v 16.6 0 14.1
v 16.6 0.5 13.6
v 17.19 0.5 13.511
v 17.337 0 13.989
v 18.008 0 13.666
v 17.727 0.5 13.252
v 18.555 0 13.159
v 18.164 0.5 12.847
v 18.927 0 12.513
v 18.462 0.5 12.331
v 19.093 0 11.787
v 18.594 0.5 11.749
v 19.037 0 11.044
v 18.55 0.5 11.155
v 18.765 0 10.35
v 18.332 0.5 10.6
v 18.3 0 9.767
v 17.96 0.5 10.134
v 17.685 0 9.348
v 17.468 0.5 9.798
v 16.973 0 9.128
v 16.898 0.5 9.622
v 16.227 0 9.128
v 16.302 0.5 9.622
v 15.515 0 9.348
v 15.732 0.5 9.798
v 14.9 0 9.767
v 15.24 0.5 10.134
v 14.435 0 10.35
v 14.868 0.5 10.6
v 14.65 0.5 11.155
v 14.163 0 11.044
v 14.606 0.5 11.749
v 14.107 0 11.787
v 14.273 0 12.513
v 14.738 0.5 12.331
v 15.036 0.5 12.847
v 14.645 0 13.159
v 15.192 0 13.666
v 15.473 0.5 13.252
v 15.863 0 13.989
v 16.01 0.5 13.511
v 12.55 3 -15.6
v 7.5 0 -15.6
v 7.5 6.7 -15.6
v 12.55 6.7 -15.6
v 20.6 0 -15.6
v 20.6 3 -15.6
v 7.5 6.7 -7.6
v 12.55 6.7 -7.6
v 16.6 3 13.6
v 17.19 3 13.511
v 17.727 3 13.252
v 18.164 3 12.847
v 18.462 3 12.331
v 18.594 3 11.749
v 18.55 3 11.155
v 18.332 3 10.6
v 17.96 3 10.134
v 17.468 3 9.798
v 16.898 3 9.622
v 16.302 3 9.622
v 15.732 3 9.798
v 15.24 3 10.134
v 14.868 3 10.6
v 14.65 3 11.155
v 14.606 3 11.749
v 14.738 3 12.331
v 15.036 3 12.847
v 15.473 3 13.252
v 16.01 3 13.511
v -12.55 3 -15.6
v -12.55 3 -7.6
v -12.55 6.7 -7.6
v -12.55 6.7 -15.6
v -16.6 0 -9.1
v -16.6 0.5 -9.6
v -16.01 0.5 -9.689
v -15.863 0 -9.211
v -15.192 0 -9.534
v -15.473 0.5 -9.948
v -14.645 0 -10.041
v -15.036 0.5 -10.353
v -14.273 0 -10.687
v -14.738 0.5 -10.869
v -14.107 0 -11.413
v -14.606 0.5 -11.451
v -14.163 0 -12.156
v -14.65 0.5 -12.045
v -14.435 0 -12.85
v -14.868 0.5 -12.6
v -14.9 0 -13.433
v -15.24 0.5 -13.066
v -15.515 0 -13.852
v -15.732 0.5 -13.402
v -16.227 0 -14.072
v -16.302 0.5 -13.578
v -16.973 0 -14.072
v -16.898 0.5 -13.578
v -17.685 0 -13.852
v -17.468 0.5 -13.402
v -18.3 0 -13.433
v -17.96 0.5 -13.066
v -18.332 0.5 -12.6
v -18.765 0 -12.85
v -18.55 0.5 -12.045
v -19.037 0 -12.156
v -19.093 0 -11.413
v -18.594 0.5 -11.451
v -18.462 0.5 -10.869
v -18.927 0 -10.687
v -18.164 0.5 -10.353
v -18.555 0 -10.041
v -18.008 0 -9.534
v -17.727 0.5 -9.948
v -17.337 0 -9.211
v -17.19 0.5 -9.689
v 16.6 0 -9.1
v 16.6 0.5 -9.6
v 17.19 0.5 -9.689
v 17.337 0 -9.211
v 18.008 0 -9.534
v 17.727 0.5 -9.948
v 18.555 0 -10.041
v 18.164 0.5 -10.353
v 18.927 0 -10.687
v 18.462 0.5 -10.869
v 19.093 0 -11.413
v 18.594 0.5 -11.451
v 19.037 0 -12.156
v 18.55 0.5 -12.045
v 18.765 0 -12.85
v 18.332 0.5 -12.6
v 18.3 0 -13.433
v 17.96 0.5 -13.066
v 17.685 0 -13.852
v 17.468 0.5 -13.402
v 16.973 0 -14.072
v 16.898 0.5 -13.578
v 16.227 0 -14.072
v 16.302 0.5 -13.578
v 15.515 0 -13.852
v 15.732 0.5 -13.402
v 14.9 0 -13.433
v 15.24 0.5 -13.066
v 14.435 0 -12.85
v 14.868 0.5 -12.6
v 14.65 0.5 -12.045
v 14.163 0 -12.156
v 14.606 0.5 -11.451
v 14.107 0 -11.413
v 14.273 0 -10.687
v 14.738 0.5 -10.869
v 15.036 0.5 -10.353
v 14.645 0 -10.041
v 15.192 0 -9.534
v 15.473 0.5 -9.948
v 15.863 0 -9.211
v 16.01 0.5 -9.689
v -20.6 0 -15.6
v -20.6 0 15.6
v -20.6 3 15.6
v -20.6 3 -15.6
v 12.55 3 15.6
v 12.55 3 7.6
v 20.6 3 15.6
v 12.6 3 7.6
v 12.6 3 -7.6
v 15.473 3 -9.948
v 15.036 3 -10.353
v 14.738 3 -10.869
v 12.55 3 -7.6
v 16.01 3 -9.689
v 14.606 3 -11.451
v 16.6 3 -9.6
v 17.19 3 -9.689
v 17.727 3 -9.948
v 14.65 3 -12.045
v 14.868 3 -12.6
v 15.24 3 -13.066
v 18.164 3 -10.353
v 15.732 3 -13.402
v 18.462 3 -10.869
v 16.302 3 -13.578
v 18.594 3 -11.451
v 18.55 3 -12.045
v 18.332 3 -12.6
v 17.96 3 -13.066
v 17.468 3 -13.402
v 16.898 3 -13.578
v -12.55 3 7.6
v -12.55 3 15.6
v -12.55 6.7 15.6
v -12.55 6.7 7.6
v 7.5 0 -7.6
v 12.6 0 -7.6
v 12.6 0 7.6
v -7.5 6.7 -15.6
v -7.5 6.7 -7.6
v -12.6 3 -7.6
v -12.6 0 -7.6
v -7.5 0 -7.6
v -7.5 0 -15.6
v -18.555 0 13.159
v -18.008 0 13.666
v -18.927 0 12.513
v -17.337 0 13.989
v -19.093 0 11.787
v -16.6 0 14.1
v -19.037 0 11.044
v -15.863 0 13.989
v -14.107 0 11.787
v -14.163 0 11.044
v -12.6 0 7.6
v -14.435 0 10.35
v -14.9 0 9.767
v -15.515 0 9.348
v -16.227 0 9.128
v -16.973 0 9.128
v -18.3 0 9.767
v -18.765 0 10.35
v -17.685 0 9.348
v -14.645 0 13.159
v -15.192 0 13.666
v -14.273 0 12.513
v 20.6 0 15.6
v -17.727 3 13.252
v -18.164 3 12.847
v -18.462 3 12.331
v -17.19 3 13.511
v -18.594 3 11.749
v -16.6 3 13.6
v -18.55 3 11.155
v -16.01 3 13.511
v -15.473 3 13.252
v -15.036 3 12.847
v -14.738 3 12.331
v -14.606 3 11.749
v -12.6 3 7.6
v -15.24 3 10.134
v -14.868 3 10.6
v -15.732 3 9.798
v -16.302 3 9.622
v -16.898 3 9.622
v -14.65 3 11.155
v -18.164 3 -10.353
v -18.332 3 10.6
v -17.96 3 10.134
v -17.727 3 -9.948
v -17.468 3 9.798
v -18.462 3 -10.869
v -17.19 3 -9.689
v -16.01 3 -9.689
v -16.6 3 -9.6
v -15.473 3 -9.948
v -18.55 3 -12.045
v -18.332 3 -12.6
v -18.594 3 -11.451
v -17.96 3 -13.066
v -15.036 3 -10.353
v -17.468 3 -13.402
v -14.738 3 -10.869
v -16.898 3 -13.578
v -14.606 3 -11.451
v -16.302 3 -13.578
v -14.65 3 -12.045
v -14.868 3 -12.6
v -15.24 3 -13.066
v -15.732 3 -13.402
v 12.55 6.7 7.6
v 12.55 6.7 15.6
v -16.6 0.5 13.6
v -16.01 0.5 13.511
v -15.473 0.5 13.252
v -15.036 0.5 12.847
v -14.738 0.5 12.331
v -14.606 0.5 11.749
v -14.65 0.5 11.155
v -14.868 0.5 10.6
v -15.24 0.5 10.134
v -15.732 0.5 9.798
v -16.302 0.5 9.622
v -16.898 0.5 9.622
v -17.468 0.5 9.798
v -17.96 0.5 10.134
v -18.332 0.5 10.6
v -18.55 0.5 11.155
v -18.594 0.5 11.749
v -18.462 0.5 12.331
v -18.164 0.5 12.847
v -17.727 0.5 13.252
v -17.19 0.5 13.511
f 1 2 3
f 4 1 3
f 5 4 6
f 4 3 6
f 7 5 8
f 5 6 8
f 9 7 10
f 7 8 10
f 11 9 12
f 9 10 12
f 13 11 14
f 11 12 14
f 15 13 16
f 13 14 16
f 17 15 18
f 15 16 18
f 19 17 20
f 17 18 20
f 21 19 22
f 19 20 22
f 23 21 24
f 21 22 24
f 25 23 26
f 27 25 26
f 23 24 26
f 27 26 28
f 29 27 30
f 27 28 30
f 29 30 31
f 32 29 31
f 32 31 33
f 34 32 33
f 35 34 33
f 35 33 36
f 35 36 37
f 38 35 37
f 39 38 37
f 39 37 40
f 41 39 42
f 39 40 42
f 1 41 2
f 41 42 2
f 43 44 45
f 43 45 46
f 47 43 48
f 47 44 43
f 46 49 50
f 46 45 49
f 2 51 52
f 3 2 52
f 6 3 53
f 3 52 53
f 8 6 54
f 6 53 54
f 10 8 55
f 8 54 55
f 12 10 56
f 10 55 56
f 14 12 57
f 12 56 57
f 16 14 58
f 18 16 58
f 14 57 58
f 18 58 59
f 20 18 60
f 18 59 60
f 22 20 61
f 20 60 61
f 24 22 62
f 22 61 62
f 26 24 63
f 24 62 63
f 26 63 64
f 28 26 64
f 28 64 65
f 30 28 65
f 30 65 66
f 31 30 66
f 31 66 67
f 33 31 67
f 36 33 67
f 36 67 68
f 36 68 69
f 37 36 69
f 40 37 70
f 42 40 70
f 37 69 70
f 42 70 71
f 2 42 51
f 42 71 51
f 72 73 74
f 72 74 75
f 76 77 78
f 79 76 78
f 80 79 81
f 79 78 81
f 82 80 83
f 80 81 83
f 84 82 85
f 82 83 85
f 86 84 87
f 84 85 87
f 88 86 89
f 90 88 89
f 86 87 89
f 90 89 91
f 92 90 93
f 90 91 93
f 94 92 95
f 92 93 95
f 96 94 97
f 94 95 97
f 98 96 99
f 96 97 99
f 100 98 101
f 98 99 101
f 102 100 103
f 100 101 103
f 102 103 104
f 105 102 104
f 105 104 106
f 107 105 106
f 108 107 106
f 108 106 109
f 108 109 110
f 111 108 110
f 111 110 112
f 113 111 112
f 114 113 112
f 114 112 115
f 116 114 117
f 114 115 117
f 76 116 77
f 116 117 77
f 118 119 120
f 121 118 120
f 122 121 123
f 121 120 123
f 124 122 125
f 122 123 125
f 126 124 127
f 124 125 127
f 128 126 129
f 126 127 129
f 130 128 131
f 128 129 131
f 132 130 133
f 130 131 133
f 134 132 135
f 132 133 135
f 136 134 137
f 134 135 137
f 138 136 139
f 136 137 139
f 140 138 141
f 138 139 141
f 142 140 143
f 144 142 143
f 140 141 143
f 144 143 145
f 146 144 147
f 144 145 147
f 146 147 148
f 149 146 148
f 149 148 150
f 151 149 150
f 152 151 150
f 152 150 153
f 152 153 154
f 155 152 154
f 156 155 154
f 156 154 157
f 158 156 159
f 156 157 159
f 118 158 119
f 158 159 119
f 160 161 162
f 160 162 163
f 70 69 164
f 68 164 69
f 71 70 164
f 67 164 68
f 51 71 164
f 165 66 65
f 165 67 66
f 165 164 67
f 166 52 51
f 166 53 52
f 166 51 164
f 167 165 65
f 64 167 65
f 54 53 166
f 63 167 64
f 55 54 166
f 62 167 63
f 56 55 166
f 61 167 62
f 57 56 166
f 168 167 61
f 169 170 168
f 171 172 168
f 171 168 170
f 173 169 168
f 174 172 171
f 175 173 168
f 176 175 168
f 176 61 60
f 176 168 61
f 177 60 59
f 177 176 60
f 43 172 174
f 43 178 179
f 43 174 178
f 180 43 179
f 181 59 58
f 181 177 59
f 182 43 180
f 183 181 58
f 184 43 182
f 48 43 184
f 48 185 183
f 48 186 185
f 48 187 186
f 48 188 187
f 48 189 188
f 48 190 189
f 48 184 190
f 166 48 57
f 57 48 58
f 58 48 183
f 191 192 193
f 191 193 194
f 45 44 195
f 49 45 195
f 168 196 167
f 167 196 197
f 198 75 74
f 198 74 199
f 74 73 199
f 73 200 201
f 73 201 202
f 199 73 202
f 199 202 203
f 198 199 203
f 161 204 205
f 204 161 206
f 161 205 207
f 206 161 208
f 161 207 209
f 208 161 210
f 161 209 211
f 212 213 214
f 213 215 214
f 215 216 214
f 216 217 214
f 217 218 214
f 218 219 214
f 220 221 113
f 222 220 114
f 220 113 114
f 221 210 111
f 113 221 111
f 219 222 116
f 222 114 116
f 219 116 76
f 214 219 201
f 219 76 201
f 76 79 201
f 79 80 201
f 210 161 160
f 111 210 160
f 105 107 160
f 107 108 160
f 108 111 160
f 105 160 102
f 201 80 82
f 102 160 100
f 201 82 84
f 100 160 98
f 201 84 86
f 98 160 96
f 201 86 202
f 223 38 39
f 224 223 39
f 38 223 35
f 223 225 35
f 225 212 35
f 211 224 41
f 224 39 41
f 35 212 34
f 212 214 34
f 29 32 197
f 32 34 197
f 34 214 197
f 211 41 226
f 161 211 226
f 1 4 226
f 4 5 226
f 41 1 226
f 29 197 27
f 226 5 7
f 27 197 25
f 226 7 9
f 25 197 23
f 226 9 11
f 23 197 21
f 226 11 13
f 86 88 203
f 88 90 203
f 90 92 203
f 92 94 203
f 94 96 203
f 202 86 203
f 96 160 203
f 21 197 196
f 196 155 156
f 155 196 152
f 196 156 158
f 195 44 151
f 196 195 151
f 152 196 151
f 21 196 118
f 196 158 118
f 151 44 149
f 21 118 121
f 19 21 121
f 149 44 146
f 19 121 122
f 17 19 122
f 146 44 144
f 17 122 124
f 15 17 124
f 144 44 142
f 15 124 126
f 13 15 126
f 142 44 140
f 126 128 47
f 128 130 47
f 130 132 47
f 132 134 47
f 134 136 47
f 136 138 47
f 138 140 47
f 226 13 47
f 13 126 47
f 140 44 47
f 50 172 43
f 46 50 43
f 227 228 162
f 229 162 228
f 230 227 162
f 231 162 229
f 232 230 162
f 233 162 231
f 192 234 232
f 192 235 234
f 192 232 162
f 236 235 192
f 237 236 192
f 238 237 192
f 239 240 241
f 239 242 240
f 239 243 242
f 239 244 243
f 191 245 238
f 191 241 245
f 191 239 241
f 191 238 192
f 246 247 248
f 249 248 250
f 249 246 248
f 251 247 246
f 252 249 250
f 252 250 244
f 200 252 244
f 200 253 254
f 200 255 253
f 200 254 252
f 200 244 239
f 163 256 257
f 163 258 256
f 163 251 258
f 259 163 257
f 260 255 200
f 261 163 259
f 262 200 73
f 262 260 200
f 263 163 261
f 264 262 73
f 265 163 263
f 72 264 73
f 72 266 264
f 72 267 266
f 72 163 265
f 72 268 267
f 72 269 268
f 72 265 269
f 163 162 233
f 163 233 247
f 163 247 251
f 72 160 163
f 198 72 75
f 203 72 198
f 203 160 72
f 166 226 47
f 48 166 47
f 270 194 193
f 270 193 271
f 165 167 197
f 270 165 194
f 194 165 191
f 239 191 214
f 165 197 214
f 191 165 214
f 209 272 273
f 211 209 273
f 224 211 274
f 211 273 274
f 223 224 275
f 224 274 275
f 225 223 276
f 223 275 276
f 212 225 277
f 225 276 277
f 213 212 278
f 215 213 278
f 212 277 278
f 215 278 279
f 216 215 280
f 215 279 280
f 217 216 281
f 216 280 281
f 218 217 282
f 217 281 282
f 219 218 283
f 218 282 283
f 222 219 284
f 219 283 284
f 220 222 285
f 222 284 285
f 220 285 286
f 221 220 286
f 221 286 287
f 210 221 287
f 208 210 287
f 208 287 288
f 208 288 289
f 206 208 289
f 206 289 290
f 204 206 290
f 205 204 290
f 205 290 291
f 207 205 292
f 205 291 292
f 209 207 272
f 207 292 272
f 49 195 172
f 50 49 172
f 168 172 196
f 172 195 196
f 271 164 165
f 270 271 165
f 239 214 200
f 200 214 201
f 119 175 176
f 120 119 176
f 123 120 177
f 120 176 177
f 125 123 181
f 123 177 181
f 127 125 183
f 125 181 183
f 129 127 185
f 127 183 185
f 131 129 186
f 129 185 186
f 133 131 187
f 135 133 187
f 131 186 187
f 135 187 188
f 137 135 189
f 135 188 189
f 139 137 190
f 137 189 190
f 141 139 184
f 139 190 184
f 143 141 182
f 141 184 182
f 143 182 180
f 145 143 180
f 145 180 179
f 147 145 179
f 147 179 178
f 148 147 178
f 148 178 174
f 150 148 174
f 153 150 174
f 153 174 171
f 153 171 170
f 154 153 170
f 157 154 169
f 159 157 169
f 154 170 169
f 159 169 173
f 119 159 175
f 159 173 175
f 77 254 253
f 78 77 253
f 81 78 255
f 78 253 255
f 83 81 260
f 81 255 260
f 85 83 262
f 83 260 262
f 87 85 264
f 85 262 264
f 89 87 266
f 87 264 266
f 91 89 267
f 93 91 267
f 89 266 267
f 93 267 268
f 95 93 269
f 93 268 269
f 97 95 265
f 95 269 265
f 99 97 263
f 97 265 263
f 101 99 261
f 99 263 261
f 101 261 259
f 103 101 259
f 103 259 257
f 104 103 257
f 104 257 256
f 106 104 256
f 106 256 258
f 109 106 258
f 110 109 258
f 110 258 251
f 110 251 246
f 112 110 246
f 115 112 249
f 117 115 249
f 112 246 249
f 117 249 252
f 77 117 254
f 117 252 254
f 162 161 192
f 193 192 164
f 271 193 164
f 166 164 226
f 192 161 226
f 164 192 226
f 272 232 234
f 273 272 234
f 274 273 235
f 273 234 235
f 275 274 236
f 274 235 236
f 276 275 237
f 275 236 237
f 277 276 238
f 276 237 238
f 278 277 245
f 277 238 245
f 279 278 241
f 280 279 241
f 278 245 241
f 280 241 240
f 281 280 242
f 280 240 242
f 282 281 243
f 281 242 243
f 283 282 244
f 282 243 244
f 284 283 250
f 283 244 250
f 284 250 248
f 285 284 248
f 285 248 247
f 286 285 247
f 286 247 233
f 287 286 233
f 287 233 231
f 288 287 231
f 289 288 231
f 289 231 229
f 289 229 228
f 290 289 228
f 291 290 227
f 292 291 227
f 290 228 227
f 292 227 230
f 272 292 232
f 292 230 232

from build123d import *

# Parameters (mm, degrees)
SKETCH1_W           = 41.2
SKETCH1_H           = 31.2
BOSS_EXTRUDE1_DEPTH = 3
SKETCH2_W           = 25.1
SKETCH2_H           = 31.2
BOSS_EXTRUDE2_DEPTH = 3.7
SKETCH3_R           = 2
CUT_EXTRUDE1_DEPTH  = 3
CUT_EXTRUDE2_REACH  = 28.695
CHAMFER1_SIZE       = 0.5


with BuildPart() as part:
    # Sketch1 → Boss-Extrude1 (new body)
    with BuildSketch(Plane(origin=(0, 0, 0), x_dir=(1, 0, 0), z_dir=(0, 1, 0))):
        Rectangle(SKETCH1_W, SKETCH1_H)
    extrude(amount=BOSS_EXTRUDE1_DEPTH)

    # Sketch2 → Boss-Extrude2 (add)
    with BuildSketch(Plane(origin=(0, 3, 0), x_dir=(1, 0, 0), z_dir=(0, 1, 0))):
        Rectangle(SKETCH2_W, SKETCH2_H)
    extrude(amount=BOSS_EXTRUDE2_DEPTH)

    # Sketch3 → Cut-Extrude1 (cut)
    with BuildSketch(Plane(origin=(0, 3, 0), x_dir=(1, 0, 0), z_dir=(0, 1, 0))):
        with Locations(Location((16.6, -11.6, 0), (0, 0, 270))):
            Circle(SKETCH3_R)
        with Locations(Location((-16.6, -11.6, 0), (0, 0, 270))):
            Circle(SKETCH3_R)
        with Locations(Location((16.6, 11.6, 0), (0, 0, 270))):
            Circle(SKETCH3_R)
        with Locations(Location((-16.6, 11.6, 0), (0, 0, 270))):
            Circle(SKETCH3_R)
    extrude(amount=-CUT_EXTRUDE1_DEPTH, mode=Mode.SUBTRACT)

    # Cut-Extrude2: up to this face of the body (flat: up to its plane)
    cut_extrude2_end = Plane(part.part.faces().sort_by_distance((0, 6.7, 0))[0])
    # Sketch4 → Cut-Extrude2 (cut, up to the picked face)
    with BuildSketch(Plane.XZ, mode=Mode.PRIVATE) as cut_extrude2_sk1:
        Polygon((-7.5, -15.6), (7.5, -15.6), (7.5, -7.6), (12.6, -7.6), (12.6, 7.6), (-12.6, 7.6), (-12.6, -7.6), (-7.5, -7.6), align=None)
    cut_extrude2_tool1 = split(extrude(cut_extrude2_sk1.sketch, amount=-CUT_EXTRUDE2_REACH, mode=Mode.PRIVATE), bisect_by=cut_extrude2_end, keep=Keep.BOTH, mode=Mode.PRIVATE)
    add(cut_extrude2_tool1.solids().sort_by(Axis((0, 0, -2.767176), (0, 1, 0)))[0], mode=Mode.SUBTRACT)

    # Chamfer1
    chamfer1_edges = [part.edges().sort_by_distance(p)[0] for p in [
        (16.6, 0, -13.6),
        (-16.6, 0, 9.6),
        (-16.6, 0, -13.6),
        (16.6, 0, 9.6),
    ]]
    chamfer(chamfer1_edges, length=CHAMFER1_SIZE)


solid = part.part
